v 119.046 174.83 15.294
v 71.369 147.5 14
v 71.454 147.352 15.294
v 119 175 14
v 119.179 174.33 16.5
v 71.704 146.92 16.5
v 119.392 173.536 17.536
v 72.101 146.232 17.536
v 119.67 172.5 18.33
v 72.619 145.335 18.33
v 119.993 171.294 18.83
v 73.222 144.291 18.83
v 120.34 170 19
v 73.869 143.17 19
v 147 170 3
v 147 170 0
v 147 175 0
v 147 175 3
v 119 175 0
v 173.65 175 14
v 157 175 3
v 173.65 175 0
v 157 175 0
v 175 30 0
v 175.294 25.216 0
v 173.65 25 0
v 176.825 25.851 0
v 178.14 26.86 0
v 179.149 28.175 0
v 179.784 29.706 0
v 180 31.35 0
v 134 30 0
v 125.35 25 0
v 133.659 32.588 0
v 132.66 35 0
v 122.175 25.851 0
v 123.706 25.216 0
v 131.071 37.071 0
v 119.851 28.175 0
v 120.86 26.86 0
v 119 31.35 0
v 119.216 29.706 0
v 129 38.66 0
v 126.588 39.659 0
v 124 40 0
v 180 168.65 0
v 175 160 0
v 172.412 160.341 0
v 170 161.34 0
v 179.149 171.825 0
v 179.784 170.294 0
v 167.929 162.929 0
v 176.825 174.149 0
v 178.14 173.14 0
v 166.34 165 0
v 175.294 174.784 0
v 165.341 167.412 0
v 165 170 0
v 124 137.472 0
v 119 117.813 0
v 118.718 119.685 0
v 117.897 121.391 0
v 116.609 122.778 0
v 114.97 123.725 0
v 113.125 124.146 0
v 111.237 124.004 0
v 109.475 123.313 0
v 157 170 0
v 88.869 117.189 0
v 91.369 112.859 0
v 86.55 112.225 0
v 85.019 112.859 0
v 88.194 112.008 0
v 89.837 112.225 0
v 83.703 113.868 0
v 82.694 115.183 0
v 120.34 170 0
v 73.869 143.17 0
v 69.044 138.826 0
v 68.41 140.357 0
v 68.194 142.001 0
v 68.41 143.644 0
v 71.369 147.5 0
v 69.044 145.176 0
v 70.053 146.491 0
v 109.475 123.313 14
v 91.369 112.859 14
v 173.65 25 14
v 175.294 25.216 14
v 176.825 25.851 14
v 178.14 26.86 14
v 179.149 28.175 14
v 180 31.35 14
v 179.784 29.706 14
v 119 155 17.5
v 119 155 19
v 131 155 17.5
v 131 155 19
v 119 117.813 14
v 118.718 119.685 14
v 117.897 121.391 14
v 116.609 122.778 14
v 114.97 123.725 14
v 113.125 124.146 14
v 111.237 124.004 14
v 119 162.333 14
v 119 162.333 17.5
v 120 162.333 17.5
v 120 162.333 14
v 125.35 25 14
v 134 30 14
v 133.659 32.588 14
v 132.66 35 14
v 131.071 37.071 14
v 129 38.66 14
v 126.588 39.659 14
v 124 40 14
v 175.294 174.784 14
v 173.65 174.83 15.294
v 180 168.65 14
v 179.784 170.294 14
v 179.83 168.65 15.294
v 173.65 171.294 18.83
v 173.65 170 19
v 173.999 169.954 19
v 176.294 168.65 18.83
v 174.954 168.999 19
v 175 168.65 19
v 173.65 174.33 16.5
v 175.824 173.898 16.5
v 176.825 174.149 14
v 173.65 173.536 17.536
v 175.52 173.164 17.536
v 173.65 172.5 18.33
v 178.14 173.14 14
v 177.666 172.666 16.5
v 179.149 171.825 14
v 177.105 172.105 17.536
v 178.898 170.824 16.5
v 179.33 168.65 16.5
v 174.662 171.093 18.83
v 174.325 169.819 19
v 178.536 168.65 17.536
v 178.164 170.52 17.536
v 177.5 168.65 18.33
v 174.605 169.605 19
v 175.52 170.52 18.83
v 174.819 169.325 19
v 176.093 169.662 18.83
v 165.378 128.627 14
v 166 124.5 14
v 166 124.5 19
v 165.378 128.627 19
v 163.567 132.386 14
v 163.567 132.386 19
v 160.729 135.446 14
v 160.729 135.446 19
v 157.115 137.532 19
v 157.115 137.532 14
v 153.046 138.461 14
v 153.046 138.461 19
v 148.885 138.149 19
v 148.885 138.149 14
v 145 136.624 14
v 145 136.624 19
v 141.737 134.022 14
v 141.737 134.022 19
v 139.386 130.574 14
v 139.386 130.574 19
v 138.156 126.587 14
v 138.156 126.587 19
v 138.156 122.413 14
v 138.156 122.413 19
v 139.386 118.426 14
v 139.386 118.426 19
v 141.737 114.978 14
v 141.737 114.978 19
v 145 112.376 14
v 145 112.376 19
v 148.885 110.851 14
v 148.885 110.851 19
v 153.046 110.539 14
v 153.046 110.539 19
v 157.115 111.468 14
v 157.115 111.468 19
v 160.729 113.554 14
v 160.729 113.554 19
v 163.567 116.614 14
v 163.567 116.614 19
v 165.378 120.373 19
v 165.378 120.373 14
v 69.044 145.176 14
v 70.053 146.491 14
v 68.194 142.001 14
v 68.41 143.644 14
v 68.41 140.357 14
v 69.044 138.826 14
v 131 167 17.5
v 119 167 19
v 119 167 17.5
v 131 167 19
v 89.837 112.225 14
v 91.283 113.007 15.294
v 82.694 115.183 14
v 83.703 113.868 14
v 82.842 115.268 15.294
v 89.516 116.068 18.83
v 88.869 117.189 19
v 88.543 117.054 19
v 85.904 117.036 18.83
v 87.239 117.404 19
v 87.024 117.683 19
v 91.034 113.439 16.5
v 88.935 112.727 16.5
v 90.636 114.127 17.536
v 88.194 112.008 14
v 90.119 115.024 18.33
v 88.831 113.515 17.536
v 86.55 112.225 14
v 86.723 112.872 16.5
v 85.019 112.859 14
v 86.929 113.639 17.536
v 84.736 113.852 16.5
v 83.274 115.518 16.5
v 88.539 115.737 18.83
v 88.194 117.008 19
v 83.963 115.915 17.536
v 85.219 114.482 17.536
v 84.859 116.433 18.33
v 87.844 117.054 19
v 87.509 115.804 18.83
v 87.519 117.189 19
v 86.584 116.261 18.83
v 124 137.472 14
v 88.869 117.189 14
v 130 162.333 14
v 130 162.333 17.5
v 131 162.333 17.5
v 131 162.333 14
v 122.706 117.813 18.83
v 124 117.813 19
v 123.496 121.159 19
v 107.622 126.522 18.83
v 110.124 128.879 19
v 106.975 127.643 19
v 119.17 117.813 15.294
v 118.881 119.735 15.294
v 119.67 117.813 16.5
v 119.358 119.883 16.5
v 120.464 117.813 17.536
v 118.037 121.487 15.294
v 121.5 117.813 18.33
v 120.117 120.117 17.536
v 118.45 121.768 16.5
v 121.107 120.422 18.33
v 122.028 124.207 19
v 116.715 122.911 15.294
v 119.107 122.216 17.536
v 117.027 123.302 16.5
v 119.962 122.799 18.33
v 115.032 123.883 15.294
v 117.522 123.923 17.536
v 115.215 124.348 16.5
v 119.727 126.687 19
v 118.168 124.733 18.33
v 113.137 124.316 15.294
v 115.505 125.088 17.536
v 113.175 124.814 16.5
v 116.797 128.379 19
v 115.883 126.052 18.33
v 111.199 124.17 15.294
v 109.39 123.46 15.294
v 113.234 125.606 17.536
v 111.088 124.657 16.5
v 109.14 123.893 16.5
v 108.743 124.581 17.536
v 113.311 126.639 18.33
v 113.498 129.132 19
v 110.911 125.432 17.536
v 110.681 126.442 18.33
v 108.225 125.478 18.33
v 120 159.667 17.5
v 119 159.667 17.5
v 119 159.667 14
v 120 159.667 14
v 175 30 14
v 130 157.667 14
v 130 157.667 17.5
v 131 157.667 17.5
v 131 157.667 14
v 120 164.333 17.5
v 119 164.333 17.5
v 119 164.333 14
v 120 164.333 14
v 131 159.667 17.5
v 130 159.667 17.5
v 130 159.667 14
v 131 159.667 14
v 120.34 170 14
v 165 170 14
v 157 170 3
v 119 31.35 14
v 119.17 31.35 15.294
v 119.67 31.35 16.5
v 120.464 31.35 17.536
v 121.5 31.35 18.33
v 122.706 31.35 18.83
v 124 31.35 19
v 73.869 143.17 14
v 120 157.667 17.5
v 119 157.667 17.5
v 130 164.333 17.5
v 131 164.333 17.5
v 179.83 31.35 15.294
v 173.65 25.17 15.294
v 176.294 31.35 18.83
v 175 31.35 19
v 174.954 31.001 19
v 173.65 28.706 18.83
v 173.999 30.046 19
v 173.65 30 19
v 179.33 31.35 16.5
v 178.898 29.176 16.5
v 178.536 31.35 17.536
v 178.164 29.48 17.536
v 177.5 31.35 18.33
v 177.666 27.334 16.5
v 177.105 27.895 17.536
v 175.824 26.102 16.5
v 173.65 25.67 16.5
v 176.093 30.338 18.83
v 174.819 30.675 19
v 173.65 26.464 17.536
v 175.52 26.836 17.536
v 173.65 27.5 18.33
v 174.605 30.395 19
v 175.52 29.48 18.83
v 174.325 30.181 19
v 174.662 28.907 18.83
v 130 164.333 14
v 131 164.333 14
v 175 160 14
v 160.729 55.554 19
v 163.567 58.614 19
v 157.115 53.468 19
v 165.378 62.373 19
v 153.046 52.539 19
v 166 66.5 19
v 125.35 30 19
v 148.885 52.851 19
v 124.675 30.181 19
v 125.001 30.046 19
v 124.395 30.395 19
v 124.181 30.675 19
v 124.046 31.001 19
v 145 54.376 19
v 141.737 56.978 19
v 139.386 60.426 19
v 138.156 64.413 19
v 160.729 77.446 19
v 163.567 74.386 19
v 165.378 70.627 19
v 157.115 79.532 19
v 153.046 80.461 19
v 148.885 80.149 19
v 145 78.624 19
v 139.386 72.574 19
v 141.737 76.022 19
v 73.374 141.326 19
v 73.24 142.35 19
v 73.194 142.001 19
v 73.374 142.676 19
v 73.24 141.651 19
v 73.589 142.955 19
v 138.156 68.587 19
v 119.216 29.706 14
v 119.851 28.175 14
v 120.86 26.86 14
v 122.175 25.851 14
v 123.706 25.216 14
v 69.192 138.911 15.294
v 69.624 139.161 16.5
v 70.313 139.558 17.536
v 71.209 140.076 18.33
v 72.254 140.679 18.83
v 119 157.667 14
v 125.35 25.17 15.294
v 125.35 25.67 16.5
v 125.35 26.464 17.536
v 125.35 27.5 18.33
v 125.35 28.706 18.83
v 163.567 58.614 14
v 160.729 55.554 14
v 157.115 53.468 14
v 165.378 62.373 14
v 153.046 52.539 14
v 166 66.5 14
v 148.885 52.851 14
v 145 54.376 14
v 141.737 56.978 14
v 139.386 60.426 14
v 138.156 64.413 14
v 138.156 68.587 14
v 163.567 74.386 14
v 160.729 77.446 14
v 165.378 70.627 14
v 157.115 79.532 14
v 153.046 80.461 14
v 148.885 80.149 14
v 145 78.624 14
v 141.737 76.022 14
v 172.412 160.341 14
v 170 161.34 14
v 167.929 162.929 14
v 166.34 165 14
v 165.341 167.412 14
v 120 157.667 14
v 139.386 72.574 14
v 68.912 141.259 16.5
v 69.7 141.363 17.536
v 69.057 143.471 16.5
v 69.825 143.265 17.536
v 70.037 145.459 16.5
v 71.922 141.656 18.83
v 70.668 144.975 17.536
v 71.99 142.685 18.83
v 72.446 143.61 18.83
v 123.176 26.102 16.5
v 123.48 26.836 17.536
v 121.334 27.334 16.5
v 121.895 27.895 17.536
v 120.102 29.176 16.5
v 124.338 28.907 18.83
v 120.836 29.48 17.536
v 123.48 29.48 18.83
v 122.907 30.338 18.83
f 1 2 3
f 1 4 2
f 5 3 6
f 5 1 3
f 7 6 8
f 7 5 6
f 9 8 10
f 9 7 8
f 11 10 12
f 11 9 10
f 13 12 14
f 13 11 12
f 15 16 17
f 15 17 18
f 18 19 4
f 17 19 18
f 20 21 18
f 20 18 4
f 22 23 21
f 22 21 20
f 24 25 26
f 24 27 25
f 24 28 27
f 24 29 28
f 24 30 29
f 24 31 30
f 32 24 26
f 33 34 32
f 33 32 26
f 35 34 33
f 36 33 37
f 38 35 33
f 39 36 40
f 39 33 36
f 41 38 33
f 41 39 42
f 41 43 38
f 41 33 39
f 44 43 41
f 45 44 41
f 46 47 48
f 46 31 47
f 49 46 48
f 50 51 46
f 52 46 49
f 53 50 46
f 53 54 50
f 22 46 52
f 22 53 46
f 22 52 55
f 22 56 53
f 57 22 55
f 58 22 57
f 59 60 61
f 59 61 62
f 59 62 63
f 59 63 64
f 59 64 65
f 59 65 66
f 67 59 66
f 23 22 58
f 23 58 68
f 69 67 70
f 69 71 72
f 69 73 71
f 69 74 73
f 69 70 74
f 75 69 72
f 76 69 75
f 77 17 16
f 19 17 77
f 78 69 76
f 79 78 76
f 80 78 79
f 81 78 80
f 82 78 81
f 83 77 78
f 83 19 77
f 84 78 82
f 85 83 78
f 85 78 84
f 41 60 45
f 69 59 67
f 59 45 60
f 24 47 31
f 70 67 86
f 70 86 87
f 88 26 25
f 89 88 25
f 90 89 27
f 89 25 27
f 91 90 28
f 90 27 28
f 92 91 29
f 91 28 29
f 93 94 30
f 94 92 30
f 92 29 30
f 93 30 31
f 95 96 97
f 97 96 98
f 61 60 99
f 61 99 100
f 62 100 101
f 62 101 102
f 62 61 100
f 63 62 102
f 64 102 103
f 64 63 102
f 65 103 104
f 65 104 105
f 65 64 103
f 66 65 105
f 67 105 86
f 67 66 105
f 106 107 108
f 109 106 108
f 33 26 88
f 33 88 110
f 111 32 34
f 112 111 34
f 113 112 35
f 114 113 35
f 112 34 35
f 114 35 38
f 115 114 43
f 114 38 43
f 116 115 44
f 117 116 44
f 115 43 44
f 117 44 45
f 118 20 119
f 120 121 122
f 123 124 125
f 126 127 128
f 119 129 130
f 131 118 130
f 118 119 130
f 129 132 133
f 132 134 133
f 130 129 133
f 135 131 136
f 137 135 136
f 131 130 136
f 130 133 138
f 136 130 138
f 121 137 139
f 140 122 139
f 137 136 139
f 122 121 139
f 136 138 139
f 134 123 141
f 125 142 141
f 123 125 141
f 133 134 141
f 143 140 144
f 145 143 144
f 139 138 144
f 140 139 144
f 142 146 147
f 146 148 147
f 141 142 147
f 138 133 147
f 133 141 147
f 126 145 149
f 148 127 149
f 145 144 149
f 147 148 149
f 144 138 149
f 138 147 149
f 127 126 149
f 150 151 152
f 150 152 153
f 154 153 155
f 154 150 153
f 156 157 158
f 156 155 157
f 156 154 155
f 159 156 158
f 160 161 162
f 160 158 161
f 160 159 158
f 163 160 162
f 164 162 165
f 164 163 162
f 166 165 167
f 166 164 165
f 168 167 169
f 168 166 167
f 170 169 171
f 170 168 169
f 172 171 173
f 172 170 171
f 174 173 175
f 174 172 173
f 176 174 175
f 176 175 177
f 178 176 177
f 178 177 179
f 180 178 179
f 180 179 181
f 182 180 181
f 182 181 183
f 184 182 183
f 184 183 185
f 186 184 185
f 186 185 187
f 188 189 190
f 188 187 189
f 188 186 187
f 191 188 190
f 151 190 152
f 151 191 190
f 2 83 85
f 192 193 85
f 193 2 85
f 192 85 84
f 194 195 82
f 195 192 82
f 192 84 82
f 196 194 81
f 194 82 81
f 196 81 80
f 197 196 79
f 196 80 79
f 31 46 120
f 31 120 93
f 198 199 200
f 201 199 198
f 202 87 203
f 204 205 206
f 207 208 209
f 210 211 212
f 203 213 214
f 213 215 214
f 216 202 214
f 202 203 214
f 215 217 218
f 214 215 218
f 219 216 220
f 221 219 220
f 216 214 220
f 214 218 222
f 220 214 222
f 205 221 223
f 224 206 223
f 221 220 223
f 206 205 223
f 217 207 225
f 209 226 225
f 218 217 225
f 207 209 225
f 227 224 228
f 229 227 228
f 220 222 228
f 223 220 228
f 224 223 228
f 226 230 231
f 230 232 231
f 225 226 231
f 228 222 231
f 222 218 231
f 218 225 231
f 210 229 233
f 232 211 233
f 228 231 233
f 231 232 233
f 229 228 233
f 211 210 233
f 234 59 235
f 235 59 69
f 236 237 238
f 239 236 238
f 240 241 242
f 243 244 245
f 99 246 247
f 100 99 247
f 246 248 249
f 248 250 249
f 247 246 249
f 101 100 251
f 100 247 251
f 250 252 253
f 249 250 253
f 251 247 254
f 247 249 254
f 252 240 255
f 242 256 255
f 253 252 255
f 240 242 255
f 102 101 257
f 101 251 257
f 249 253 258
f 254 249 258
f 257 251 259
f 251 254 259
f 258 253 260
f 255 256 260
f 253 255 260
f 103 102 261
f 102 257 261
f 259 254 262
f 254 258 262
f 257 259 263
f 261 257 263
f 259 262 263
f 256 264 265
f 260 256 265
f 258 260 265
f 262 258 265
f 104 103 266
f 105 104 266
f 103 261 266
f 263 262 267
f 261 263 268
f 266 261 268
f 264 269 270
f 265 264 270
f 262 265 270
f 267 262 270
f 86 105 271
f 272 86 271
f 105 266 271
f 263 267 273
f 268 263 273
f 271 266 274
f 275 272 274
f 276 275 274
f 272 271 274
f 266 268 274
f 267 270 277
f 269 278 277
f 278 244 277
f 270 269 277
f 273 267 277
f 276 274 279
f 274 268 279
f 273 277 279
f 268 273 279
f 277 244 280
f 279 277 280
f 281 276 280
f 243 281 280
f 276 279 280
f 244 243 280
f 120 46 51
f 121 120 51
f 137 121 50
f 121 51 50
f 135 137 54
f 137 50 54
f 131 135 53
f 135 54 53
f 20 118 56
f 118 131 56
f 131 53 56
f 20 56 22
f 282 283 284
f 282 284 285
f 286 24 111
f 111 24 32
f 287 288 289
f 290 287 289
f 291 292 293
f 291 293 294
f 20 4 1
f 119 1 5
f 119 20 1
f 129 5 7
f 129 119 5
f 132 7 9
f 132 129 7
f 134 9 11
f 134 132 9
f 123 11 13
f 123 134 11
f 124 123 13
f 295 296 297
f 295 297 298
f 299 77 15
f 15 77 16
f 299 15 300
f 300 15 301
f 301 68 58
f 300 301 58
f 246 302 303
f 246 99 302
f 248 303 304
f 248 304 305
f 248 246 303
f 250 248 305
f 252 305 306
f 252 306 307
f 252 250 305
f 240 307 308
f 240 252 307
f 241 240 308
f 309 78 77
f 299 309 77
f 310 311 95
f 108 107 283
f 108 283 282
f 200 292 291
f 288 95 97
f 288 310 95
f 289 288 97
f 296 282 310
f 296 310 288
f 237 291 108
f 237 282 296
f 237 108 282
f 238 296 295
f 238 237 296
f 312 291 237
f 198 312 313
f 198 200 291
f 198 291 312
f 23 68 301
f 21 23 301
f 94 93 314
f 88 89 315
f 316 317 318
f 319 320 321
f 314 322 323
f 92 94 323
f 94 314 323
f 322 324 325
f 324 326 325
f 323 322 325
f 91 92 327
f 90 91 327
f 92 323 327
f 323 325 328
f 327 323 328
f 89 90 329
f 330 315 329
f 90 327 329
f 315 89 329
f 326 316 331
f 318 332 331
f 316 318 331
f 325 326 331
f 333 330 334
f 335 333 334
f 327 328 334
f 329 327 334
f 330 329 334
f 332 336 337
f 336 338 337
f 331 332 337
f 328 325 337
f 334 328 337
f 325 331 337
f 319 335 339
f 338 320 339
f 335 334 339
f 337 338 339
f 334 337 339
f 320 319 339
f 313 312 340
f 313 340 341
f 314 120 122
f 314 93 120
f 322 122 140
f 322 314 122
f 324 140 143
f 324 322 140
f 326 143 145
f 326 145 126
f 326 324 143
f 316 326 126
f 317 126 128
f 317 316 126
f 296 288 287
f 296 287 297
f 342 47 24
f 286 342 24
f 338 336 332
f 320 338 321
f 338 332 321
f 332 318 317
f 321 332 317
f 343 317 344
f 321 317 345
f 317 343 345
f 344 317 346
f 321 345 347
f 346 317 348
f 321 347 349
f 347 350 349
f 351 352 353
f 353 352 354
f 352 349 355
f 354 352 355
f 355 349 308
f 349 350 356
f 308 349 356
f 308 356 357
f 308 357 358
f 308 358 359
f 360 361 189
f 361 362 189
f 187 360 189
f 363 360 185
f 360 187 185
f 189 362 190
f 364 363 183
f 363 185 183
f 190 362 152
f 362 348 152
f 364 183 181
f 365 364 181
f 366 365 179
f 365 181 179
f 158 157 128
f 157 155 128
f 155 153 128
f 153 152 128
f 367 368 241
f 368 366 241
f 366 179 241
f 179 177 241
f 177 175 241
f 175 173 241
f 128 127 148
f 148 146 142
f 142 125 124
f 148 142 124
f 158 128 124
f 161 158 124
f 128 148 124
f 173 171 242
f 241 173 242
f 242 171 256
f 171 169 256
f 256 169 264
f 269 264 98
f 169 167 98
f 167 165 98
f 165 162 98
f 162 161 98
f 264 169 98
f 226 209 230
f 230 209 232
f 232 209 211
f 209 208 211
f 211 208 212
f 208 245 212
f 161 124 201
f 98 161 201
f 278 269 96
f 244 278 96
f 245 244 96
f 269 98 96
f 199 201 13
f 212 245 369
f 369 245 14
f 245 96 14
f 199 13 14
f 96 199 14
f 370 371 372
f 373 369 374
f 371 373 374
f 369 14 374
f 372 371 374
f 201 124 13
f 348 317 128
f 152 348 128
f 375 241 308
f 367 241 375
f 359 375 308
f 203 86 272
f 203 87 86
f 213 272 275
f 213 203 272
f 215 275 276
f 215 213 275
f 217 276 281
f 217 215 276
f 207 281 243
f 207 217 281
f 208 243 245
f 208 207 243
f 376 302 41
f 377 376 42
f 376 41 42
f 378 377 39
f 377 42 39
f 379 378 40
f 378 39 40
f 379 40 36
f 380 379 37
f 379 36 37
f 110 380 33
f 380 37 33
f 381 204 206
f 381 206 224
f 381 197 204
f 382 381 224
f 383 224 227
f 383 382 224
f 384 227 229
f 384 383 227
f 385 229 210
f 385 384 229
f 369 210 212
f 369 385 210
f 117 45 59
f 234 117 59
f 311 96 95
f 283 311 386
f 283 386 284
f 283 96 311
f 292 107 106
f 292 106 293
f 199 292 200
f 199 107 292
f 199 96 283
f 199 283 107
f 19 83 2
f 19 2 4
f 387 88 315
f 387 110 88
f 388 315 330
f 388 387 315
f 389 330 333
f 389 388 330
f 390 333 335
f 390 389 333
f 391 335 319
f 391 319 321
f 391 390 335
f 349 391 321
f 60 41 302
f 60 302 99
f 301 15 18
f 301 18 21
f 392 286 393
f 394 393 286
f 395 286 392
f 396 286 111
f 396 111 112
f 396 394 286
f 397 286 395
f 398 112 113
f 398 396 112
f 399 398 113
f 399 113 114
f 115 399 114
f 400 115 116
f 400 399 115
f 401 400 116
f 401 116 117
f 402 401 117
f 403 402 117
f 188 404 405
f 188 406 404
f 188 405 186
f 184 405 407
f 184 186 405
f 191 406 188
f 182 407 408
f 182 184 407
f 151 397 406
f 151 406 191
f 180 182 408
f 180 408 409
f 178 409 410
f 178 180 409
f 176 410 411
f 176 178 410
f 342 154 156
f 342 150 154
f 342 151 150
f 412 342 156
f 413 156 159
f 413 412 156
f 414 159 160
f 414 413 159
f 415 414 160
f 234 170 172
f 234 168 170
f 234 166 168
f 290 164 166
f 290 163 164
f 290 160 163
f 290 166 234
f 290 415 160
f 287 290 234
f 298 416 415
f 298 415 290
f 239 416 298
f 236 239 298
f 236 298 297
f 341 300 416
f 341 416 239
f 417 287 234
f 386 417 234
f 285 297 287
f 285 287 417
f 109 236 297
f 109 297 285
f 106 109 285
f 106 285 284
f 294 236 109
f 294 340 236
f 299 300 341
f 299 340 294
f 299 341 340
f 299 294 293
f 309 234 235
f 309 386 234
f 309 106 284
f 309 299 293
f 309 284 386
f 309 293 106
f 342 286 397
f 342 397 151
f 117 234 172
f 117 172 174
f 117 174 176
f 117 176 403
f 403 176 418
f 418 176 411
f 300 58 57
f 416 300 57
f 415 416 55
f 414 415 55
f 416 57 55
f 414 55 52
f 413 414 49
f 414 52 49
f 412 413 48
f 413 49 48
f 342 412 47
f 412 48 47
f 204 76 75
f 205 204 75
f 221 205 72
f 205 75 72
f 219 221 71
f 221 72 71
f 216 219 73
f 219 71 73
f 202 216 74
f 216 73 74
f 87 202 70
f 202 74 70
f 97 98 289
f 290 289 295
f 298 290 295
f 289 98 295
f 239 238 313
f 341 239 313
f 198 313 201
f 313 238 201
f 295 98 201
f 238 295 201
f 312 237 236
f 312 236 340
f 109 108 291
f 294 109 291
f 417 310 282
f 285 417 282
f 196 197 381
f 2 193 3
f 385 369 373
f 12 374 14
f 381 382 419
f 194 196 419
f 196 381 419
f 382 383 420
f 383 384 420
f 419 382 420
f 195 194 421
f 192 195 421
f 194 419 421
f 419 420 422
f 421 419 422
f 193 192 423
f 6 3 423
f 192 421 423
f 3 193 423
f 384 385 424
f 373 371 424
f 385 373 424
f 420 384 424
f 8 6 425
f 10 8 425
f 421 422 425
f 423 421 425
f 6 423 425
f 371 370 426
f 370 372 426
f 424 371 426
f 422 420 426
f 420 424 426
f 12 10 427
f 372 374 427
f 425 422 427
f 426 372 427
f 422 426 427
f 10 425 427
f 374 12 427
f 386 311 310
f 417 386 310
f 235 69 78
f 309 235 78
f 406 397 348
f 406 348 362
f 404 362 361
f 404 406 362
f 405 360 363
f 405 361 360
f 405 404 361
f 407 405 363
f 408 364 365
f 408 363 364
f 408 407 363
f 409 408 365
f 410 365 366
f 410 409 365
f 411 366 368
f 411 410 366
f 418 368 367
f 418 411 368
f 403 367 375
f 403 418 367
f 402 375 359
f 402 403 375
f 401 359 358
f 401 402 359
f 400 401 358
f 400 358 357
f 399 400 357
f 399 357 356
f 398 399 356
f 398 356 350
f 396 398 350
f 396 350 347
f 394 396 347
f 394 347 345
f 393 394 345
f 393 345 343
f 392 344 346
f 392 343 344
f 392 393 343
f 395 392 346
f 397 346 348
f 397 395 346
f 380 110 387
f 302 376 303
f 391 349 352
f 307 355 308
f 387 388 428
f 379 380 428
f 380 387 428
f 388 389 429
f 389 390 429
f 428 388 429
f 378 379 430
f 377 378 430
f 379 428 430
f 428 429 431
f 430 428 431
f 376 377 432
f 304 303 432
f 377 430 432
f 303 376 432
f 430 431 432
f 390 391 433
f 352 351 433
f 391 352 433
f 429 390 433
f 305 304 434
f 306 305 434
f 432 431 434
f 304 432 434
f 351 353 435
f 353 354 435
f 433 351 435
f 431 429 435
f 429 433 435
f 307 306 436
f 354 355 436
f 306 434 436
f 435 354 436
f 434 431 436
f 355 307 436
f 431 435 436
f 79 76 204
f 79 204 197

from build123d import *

# Parameters (mm, degrees)
PAD001_DEPTH         = 19
SKETCH004_R          = 14
POCKET_DEPTH         = 0.001
POCKET_DEPTH_BACK    = 19.001
POCKET001_DEPTH      = 14
FILLET_R             = 5
SKETCH012_W          = 12
SKETCH012_H          = 12
POCKET003_DEPTH      = 1.5
SKETCH013_W          = 1
SKETCH013_H          = 2
POCKET004_DEPTH      = 19.001
POCKET004_DEPTH_BACK = 0.001
SKETCH016_W          = 10
SKETCH016_H          = 3
POCKET007_DEPTH      = 75.001


with BuildPart() as part:
    # Sketch005 → Pad001 (new body)
    with BuildSketch(Plane.XY):
        with BuildLine():
            Line((119, 31.35), (119, 117.813456))
            ThreePointArc((119, 117.813456), (115.825, 123.312717), (109.475, 123.312717))
            Line((109.475, 123.312717), (91.368603, 112.858984))
            ThreePointArc((82.694341, 115.183245), (86.550102, 112.224616), (91.368603, 112.858984))
            Line((82.694341, 115.183245), (69.044341, 138.825739))
            ThreePointArc((71.368603, 147.5), (68.409974, 143.64424), (69.044341, 138.825739))
            Line((71.368603, 147.5), (119, 175))
            Line((119, 175), (173.65, 175))
            ThreePointArc((180, 168.65), (178.140128, 173.140128), (173.65, 175))
            Line((180, 168.65), (180, 31.35))
            ThreePointArc((173.65, 25), (178.140128, 26.859872), (180, 31.35))
            Line((173.65, 25), (125.35, 25))
            ThreePointArc((119, 31.35), (120.859872, 26.859872), (125.35, 25))
        make_face()
    extrude(amount=PAD001_DEPTH)

    # Sketch004 → Pocket (cut, two sides)
    with BuildSketch(Plane.XY) as pocket_sk:
        with Locations((152, 124.5)):
            Circle(SKETCH004_R)
        with Locations((152, 66.5)):
            Circle(SKETCH004_R)
    extrude(amount=-POCKET_DEPTH, mode=Mode.SUBTRACT)
    extrude(pocket_sk.sketch, amount=POCKET_DEPTH_BACK, mode=Mode.SUBTRACT)

    # Sketch006 → Pocket001 (cut)
    with BuildSketch(Plane.XY):
        with BuildLine():
            Line((73.868603, 143.169873), (120.339746, 170))
            Line((120.339746, 170), (165, 170))
            ThreePointArc((165, 170), (167.928932, 162.928932), (175, 160))
            Line((175, 160), (175, 30))
            Line((175, 30), (134, 30))
            ThreePointArc((134, 30), (131.071068, 37.071068), (124, 40))
            Line((124, 40), (124, 137.472233))
            Line((124, 137.472233), (88.868603, 117.189111))
            Line((88.868603, 117.189111), (73.868603, 143.169873))
        make_face()
    extrude(amount=POCKET001_DEPTH, mode=Mode.SUBTRACT)

    # Fillet
    fillet_edges = [part.edges().sort_by_distance(p)[0] for p in [
        (119, 74.581728, 19),
    ]]
    fillet(fillet_edges, radius=FILLET_R)

    # Sketch012 → Pocket003 (cut, symmetric)
    with BuildSketch(Plane.XY.offset(19)):
        with Locations((125, 161)):
            Rectangle(SKETCH012_W, SKETCH012_H)
    extrude(amount=POCKET003_DEPTH, both=True, mode=Mode.SUBTRACT)

    # Sketch013 → Pocket004 (cut, two sides)
    with BuildSketch(Plane.XY.offset(19)) as pocket004_sk:
        with Locations((119.5, 163.333333)):
            Rectangle(SKETCH013_W, SKETCH013_H)
        with Locations((130.5, 163.333333)):
            Rectangle(SKETCH013_W, SKETCH013_H)
        with Locations((119.5, 158.666667)):
            Rectangle(SKETCH013_W, SKETCH013_H)
        with Locations((130.5, 158.666667)):
            Rectangle(SKETCH013_W, SKETCH013_H)
    extrude(amount=-POCKET004_DEPTH, mode=Mode.SUBTRACT)
    extrude(pocket004_sk.sketch, amount=POCKET004_DEPTH_BACK, mode=Mode.SUBTRACT)

    # Sketch016 → Pocket007 (cut, through all)
    with BuildSketch(Plane.XZ.offset(-100)):
        with Locations((152, 1.5)):
            Rectangle(SKETCH016_W, SKETCH016_H)
    extrude(amount=-POCKET007_DEPTH, mode=Mode.SUBTRACT)


solid = part.part
